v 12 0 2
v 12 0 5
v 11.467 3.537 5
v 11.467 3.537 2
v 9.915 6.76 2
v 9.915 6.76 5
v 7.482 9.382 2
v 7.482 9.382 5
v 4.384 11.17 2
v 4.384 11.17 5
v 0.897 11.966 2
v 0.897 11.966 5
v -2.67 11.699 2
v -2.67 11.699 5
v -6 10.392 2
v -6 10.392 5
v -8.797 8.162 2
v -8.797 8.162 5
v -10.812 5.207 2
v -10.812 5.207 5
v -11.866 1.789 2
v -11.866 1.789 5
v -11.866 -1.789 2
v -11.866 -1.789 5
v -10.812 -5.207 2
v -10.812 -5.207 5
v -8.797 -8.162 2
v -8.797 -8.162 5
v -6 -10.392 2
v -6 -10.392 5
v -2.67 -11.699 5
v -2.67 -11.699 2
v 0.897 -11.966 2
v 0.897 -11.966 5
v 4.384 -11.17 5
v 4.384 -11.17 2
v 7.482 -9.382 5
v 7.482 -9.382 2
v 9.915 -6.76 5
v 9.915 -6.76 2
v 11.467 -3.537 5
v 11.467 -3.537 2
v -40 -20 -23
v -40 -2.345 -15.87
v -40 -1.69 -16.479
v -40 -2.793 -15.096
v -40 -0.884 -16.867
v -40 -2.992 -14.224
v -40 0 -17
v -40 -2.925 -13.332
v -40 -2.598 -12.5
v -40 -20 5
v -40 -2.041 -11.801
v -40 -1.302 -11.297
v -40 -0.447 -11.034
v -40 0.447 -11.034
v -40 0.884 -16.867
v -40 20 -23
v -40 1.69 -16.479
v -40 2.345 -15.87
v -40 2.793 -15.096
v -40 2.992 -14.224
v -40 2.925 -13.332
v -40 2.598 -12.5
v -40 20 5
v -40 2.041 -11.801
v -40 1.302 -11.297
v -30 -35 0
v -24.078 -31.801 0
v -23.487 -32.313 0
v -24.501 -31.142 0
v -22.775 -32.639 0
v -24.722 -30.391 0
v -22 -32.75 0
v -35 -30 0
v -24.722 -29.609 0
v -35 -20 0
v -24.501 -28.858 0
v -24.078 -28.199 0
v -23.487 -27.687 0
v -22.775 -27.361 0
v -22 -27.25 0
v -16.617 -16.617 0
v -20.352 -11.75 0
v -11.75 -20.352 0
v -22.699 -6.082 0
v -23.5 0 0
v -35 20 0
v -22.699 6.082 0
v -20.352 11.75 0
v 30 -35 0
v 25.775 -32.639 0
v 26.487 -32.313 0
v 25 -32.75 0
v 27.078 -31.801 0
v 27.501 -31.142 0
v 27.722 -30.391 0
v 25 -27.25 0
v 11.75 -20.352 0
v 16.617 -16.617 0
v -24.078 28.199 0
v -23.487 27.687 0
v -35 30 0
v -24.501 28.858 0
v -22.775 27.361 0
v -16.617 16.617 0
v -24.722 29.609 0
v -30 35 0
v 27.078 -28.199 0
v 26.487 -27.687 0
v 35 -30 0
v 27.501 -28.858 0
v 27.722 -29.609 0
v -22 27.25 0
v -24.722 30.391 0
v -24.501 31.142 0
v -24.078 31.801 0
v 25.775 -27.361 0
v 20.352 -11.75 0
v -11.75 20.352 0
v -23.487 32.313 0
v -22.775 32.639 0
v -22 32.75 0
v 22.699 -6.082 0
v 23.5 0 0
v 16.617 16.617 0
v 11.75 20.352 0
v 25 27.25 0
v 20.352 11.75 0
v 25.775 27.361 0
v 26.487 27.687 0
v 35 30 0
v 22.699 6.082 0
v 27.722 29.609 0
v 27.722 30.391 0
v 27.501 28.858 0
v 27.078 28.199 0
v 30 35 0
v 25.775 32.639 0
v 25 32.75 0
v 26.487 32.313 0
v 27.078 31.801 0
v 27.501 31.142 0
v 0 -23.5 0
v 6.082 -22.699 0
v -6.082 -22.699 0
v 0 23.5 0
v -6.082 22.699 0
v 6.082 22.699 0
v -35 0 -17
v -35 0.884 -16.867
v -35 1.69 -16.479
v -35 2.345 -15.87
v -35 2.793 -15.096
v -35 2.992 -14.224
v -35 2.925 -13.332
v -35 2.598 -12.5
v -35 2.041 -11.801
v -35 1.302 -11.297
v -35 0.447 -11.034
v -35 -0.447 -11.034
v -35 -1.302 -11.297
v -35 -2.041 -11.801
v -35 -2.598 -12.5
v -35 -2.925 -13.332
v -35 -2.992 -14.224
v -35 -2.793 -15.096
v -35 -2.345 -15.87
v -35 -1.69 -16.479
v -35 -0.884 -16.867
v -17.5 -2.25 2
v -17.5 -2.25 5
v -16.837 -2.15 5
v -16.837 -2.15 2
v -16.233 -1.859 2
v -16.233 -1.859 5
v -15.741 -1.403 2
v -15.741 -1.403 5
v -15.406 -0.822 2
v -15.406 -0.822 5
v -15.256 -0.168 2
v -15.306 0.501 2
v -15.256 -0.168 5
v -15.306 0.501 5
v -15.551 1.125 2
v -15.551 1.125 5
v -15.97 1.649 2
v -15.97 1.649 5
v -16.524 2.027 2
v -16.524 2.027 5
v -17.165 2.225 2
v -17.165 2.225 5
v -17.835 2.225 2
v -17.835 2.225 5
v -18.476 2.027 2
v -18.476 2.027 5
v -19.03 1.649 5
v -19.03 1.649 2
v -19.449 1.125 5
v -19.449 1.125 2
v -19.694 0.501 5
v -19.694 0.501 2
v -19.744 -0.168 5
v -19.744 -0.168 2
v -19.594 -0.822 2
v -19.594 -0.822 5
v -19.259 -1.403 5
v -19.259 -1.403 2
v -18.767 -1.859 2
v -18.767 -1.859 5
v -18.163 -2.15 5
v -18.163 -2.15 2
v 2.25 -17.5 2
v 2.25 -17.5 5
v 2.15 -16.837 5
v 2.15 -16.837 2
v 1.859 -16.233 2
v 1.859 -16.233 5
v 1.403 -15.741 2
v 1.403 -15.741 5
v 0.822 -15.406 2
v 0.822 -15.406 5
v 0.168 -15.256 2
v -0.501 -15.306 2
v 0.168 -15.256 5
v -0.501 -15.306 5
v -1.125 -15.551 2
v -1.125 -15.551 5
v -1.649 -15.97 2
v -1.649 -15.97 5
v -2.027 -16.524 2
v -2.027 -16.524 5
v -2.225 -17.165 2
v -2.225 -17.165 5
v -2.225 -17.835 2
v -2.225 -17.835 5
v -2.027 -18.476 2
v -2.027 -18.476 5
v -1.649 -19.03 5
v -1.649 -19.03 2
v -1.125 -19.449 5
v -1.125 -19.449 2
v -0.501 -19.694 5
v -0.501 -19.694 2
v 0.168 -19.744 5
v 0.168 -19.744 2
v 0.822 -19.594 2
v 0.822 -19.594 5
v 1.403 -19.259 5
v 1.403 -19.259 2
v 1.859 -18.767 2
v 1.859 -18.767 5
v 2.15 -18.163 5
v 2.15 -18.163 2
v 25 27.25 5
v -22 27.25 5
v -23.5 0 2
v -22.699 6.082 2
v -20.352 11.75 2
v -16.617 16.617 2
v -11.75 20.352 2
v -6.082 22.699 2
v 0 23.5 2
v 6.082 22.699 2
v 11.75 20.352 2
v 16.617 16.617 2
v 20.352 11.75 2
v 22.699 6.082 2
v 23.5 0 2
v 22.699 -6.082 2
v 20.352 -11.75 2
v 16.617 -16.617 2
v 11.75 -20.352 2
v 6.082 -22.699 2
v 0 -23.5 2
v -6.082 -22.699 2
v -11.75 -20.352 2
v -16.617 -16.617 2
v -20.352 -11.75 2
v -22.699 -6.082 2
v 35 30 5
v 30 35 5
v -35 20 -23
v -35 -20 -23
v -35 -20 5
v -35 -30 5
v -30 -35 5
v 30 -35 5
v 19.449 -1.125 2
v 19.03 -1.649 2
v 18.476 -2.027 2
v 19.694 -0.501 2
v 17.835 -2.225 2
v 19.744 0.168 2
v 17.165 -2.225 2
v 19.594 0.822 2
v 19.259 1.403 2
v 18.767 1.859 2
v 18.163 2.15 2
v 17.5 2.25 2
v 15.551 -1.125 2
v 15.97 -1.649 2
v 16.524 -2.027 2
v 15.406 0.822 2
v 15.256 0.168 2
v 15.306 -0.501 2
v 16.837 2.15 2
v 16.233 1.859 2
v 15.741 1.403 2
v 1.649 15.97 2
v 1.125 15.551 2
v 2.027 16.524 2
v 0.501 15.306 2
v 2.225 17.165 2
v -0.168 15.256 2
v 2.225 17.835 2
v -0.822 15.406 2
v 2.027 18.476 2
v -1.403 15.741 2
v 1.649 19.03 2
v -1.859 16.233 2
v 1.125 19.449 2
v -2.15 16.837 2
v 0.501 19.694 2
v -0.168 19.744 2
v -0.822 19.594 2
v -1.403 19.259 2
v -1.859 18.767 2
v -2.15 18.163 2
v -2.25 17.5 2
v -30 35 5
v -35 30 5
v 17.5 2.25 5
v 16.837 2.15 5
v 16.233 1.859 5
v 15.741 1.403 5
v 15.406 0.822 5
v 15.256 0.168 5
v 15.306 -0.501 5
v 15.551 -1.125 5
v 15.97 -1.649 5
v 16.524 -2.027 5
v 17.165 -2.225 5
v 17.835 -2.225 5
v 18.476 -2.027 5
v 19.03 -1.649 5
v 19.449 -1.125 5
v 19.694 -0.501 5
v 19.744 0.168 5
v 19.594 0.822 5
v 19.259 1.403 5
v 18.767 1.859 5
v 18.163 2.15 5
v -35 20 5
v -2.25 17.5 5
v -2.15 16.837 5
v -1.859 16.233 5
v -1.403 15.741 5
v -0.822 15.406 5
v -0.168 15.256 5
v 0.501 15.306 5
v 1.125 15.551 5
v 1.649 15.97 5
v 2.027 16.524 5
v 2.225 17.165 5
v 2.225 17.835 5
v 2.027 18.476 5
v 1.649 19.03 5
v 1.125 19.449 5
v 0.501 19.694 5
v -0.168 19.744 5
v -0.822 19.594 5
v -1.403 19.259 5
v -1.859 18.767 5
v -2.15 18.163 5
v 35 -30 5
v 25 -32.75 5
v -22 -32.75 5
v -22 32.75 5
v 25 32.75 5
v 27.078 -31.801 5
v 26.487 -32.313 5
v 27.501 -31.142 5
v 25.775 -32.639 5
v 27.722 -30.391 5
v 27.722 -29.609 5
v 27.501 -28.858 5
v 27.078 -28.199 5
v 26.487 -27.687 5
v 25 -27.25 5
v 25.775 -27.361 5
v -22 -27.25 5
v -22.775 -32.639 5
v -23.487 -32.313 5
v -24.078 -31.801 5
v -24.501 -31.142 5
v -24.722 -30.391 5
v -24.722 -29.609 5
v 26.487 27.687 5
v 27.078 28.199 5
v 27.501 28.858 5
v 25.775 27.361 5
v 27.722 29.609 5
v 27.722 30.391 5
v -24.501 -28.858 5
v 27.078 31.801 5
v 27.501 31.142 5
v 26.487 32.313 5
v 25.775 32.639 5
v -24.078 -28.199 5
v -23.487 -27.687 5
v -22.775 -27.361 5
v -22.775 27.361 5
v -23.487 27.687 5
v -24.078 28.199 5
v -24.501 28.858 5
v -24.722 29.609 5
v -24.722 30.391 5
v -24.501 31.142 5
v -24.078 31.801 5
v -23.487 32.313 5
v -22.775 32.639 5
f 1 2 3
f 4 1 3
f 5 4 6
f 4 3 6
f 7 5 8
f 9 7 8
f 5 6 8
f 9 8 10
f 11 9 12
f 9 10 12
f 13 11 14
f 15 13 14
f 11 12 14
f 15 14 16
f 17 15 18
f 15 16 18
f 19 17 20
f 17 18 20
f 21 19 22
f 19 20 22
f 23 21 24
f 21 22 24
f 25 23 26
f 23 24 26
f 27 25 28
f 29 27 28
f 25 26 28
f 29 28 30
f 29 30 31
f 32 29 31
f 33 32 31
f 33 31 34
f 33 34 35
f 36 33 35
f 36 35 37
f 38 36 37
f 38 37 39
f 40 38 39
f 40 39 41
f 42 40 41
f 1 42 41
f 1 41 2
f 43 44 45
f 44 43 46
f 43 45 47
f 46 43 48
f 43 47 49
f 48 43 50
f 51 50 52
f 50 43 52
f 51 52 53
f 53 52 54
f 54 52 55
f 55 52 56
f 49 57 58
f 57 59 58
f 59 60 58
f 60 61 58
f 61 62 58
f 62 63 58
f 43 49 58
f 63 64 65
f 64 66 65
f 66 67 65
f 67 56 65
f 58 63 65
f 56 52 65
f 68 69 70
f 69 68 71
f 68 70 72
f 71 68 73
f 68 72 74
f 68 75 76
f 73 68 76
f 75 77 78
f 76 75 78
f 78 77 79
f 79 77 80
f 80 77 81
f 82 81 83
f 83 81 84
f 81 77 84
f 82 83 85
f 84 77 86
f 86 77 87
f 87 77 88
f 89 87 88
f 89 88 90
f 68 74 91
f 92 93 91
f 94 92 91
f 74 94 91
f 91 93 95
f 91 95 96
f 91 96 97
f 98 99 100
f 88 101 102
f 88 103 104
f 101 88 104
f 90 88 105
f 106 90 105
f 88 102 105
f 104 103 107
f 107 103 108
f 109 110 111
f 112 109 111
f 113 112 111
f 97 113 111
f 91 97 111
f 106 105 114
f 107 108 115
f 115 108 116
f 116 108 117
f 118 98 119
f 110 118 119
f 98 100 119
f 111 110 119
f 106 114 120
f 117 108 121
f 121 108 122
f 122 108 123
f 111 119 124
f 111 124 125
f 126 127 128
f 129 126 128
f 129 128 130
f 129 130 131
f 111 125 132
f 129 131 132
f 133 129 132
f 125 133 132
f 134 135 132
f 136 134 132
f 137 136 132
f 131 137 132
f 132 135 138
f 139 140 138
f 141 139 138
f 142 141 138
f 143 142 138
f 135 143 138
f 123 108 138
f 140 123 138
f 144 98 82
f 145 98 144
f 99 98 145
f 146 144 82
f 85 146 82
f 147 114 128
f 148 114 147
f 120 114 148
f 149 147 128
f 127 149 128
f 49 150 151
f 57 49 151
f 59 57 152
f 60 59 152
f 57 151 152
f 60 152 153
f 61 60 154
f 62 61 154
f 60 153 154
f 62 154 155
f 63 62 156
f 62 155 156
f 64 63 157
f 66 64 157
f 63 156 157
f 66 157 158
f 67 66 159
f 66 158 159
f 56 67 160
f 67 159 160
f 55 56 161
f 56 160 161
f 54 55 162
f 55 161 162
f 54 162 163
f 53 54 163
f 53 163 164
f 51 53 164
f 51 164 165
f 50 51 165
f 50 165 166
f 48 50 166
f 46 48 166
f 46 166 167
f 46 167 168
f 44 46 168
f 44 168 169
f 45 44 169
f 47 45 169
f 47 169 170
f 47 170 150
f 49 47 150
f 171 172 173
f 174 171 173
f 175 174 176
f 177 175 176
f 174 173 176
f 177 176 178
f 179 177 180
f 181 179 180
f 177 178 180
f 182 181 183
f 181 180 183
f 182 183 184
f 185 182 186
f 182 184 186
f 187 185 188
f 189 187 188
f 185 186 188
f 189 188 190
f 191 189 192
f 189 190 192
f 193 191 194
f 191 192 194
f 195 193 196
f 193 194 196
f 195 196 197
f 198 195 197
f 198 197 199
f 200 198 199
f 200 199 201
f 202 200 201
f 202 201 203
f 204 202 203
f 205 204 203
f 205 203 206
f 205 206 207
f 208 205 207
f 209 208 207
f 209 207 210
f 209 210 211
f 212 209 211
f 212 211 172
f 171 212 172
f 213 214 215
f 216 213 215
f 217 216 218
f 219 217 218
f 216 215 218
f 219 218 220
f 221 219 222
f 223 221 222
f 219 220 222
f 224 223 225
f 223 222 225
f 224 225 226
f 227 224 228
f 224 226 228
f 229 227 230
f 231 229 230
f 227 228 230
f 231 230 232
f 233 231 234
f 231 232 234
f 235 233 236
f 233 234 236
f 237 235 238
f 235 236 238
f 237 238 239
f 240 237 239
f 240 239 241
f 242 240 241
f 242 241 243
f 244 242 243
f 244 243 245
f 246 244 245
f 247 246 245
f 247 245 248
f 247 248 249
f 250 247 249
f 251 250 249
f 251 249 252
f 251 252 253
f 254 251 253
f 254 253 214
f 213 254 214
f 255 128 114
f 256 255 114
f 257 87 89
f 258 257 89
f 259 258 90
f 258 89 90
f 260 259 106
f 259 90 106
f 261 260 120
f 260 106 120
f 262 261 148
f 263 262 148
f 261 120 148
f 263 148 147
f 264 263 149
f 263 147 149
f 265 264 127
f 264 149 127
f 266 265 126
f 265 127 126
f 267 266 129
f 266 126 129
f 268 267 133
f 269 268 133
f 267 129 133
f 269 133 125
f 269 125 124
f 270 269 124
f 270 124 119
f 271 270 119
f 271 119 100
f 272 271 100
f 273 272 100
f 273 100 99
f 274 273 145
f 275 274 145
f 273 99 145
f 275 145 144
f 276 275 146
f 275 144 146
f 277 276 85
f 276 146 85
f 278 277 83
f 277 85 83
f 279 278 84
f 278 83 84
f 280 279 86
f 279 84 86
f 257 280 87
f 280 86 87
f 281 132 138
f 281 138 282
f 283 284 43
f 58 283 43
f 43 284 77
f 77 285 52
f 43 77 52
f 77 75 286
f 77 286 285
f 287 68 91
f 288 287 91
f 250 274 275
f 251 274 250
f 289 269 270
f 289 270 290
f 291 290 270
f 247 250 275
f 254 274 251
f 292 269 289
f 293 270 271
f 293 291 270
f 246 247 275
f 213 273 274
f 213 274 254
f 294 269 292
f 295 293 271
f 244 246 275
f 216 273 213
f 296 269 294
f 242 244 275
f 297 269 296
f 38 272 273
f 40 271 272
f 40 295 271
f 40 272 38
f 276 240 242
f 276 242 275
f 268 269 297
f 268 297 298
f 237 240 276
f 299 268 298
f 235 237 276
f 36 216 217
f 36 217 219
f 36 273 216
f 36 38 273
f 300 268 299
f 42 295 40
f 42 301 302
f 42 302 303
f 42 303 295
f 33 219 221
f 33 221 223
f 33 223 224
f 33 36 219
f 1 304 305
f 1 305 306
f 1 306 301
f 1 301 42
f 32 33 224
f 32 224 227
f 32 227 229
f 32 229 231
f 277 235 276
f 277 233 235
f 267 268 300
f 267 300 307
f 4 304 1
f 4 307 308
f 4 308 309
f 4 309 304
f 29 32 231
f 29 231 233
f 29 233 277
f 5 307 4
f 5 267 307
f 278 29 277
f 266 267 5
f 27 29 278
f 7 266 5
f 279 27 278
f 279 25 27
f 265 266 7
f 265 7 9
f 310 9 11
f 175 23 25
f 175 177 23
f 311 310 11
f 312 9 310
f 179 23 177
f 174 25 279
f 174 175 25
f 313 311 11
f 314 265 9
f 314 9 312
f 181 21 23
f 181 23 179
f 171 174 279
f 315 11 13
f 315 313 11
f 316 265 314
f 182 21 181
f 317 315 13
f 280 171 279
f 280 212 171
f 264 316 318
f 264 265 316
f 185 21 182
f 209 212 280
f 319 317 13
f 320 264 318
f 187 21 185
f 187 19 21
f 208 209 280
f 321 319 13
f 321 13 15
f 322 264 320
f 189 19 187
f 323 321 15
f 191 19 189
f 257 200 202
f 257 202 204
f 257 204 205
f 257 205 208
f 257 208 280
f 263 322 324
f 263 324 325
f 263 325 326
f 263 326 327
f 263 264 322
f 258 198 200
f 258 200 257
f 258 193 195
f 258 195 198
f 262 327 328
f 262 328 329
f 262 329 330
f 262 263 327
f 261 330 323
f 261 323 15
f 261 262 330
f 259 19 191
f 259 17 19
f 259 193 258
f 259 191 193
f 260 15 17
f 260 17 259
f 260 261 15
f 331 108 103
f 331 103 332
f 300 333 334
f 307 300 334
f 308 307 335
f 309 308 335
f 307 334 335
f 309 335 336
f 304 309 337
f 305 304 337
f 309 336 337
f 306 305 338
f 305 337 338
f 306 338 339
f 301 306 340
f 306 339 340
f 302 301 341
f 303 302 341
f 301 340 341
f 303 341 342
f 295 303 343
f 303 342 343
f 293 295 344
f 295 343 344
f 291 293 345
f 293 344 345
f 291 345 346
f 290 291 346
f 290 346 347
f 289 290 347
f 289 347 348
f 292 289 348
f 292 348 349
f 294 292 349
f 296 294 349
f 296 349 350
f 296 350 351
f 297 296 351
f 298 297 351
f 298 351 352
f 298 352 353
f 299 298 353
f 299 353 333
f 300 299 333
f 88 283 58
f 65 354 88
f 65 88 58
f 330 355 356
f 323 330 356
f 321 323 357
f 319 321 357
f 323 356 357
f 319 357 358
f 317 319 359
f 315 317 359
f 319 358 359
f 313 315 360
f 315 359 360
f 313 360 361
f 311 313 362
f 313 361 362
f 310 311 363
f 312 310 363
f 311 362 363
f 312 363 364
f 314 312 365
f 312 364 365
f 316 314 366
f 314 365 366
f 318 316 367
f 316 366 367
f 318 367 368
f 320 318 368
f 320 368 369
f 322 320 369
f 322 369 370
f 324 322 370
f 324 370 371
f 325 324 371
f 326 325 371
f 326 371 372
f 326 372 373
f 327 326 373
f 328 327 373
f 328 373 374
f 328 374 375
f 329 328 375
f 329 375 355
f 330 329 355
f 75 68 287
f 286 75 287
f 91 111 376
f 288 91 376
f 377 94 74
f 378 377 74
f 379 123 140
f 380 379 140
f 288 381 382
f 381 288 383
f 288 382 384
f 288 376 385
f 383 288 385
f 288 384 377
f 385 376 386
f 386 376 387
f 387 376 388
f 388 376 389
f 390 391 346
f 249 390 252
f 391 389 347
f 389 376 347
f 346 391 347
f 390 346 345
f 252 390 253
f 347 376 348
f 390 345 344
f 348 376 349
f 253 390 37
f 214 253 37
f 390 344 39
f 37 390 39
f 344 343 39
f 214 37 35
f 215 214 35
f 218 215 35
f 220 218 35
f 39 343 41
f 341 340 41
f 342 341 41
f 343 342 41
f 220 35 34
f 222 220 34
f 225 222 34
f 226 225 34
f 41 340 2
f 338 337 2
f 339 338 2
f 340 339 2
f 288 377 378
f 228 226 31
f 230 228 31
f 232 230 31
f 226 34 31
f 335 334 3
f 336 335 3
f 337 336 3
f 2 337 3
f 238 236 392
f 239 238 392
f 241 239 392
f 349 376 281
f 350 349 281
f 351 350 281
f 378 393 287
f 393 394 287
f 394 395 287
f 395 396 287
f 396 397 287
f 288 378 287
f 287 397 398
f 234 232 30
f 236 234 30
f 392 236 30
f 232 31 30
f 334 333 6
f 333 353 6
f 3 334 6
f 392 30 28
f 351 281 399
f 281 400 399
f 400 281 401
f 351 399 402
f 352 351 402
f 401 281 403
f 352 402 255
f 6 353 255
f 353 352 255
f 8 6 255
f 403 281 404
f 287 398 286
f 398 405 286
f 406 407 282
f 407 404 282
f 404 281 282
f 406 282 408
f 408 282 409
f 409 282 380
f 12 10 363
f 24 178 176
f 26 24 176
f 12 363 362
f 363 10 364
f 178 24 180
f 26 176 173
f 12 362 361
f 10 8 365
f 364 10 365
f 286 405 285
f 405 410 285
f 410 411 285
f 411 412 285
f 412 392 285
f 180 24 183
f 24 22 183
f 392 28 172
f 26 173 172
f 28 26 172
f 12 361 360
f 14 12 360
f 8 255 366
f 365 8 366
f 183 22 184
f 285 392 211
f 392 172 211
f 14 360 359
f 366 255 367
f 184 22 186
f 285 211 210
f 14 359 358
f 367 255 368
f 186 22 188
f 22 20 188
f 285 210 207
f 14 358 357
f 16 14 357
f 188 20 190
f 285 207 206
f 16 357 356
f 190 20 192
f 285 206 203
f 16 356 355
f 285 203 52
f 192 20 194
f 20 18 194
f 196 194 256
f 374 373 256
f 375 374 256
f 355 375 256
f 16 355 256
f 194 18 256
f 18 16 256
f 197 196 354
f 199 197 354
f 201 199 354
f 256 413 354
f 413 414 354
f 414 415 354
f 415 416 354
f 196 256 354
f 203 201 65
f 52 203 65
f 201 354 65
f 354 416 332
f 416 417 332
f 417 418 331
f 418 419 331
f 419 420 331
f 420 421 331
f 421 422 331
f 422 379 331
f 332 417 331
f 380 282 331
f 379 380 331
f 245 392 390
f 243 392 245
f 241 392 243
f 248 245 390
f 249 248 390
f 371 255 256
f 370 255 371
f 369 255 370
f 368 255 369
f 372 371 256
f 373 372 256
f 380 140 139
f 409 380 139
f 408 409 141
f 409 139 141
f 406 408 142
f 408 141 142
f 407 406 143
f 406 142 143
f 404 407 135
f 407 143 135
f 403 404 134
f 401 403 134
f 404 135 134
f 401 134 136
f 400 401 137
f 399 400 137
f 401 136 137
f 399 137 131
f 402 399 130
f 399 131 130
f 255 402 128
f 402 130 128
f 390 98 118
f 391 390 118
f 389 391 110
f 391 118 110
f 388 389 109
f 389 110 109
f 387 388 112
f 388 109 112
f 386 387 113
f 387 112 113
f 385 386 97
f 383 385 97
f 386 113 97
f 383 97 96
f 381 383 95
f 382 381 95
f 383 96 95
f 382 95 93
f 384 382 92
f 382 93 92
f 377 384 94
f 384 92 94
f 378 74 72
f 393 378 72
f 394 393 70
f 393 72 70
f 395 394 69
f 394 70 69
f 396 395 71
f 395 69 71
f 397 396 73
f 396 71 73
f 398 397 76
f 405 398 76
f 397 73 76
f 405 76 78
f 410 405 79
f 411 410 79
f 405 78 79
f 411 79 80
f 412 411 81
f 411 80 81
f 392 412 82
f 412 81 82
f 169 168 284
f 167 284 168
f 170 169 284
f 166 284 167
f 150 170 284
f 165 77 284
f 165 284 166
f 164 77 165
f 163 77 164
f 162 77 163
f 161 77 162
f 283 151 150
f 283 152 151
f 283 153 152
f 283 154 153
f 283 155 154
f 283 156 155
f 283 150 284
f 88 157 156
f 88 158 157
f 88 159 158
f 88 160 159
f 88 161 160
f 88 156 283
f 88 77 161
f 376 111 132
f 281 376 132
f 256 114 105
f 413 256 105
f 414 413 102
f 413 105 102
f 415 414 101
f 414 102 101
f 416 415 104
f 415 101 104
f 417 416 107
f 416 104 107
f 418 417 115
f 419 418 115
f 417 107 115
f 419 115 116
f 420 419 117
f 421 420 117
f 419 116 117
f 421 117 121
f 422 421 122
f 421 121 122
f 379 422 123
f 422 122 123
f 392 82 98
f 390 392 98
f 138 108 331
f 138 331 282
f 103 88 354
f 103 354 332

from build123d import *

# Parameters (mm, degrees)
ESQUISSE1_W                  = 70
ESQUISSE1_H                  = 70
EXTRUSION1_DEPTH             = 5
CHANFREIN1_SIZE              = 5
EXTRUSION2_DEPTH             = 23
EXTRUSION2_DEPTH_BACK        = 5
ESQUISSE2_W                  = 5
ESQUISSE2_H                  = 40
ESQUISSE3_R                  = 3
ENL_V_MAT_EXTRU_1_DEPTH      = 82.572054038
ESQUISSE4_R                  = 12
ENL_V_MAT_EXTRU_2_DEPTH      = 61.074953184
ESQUISSE5_R                  = 23.5
ENL_V_MAT_EXTRU_3_DEPTH      = 2
ESQUISSE6_R                  = 2.25
ENL_V_MAT_EXTRU_4_DEPTH      = 61.074953184
R_P_TITION_CIRCULAIRE1_COUNT = 4


with BuildPart() as part:
    # Esquisse1 → Extrusion1 (new body)
    with BuildSketch(Plane.XY):
        Rectangle(ESQUISSE1_W, ESQUISSE1_H)
        with BuildLine():
            Line((-22, 32.75), (25, 32.75))
            ThreePointArc((25, 32.75), (27.75, 30), (25, 27.25))
            Line((25, 27.25), (-22, 27.25))
            ThreePointArc((-22, 27.25), (-24.75, 30), (-22, 32.75))
        make_face(mode=Mode.SUBTRACT)
        with BuildLine():
            Line((-22, -27.25), (25, -27.25))
            ThreePointArc((25, -27.25), (27.75, -30), (25, -32.75))
            Line((25, -32.75), (-22, -32.75))
            ThreePointArc((-22, -32.75), (-24.75, -30), (-22, -27.25))
        make_face(mode=Mode.SUBTRACT)
    extrude(amount=EXTRUSION1_DEPTH)

    # Chanfrein1
    chanfrein1_edges = [part.edges().sort_by_distance(p)[0] for p in [
        (-35, 35, 2.5),
        (35, 35, 2.5),
        (35, -35, 2.5),
        (-35, -35, 2.5),
    ]]
    chamfer(chanfrein1_edges, length=CHANFREIN1_SIZE)

    # Esquisse2 → Extrusion2 (add, two sides: drawn at the far end of the back side and taken through both)
    with BuildSketch(Plane(origin=(0, 0, 0), x_dir=(-1, 0, 0), z_dir=(0, 0, -1)).offset(-EXTRUSION2_DEPTH_BACK)):
        with Locations((37.5, 0)):
            Rectangle(ESQUISSE2_W, ESQUISSE2_H)
    extrude(amount=EXTRUSION2_DEPTH + EXTRUSION2_DEPTH_BACK)

    # Esquisse3 → Enlèv. mat.-Extru.1 (cut, through all)
    with BuildSketch(Plane(origin=(-35, 0, 0), x_dir=(0, 0, -1), z_dir=(1, 0, 0))):
        with Locations((14, 0)):
            Circle(ESQUISSE3_R)
    extrude(amount=-ENL_V_MAT_EXTRU_1_DEPTH, mode=Mode.SUBTRACT)

    # Esquisse4 → Enlèv. mat.-Extru.2 (cut, through all)
    with BuildSketch(Plane.XY.offset(5)):
        Circle(ESQUISSE4_R)
    extrude(amount=-ENL_V_MAT_EXTRU_2_DEPTH, mode=Mode.SUBTRACT)

    # Esquisse5 → Enlèv. mat.-Extru.3 (cut)
    with BuildSketch(Plane(origin=(0, 0, 0), x_dir=(-1, 0, 0), z_dir=(0, 0, -1))):
        Circle(ESQUISSE5_R)
    extrude(amount=-ENL_V_MAT_EXTRU_3_DEPTH, mode=Mode.SUBTRACT)

    # Esquisse6 → Enlèv. mat.-Extru.4 (cut, through all)
    with BuildSketch(Plane.XY.offset(5)):
        with Locations((0, -17.5)):
            Circle(ESQUISSE6_R)
    enl_v_mat_extru_4 = extrude(amount=-ENL_V_MAT_EXTRU_4_DEPTH, mode=Mode.SUBTRACT)

    # Répétition circulaire1: Enlèv. mat.-Extru.4 ×4 about axis
    r_p_tition_circulaire1_axis = Axis((0, 0, 0), (0, 0, 1))
    for i in range(1, R_P_TITION_CIRCULAIRE1_COUNT):
        add(enl_v_mat_extru_4.rotate(r_p_tition_circulaire1_axis, i * 360 / R_P_TITION_CIRCULAIRE1_COUNT), mode=Mode.SUBTRACT)


solid = part.part
